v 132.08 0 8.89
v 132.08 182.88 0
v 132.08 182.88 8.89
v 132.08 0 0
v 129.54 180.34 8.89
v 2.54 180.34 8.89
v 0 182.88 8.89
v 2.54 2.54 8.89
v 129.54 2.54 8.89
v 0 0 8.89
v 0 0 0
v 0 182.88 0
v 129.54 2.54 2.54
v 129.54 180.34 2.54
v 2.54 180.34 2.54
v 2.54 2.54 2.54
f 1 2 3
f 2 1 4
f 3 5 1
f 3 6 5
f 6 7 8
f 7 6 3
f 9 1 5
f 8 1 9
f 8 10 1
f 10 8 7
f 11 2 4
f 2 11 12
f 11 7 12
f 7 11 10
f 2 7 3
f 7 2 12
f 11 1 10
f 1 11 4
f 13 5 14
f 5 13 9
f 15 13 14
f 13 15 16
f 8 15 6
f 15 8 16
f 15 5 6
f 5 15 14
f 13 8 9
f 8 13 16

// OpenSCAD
inch = 25.4;

width = 5 * inch;
height = 7 * inch;
depth = .25 * inch;

wall = .1 * inch;

difference() {
    cube([(width + (wall * 2)), (height + (wall * 2)), (depth + wall)]);
    translate([wall, wall, wall]) {
        cube([width, height, depth]);
    }
}    
